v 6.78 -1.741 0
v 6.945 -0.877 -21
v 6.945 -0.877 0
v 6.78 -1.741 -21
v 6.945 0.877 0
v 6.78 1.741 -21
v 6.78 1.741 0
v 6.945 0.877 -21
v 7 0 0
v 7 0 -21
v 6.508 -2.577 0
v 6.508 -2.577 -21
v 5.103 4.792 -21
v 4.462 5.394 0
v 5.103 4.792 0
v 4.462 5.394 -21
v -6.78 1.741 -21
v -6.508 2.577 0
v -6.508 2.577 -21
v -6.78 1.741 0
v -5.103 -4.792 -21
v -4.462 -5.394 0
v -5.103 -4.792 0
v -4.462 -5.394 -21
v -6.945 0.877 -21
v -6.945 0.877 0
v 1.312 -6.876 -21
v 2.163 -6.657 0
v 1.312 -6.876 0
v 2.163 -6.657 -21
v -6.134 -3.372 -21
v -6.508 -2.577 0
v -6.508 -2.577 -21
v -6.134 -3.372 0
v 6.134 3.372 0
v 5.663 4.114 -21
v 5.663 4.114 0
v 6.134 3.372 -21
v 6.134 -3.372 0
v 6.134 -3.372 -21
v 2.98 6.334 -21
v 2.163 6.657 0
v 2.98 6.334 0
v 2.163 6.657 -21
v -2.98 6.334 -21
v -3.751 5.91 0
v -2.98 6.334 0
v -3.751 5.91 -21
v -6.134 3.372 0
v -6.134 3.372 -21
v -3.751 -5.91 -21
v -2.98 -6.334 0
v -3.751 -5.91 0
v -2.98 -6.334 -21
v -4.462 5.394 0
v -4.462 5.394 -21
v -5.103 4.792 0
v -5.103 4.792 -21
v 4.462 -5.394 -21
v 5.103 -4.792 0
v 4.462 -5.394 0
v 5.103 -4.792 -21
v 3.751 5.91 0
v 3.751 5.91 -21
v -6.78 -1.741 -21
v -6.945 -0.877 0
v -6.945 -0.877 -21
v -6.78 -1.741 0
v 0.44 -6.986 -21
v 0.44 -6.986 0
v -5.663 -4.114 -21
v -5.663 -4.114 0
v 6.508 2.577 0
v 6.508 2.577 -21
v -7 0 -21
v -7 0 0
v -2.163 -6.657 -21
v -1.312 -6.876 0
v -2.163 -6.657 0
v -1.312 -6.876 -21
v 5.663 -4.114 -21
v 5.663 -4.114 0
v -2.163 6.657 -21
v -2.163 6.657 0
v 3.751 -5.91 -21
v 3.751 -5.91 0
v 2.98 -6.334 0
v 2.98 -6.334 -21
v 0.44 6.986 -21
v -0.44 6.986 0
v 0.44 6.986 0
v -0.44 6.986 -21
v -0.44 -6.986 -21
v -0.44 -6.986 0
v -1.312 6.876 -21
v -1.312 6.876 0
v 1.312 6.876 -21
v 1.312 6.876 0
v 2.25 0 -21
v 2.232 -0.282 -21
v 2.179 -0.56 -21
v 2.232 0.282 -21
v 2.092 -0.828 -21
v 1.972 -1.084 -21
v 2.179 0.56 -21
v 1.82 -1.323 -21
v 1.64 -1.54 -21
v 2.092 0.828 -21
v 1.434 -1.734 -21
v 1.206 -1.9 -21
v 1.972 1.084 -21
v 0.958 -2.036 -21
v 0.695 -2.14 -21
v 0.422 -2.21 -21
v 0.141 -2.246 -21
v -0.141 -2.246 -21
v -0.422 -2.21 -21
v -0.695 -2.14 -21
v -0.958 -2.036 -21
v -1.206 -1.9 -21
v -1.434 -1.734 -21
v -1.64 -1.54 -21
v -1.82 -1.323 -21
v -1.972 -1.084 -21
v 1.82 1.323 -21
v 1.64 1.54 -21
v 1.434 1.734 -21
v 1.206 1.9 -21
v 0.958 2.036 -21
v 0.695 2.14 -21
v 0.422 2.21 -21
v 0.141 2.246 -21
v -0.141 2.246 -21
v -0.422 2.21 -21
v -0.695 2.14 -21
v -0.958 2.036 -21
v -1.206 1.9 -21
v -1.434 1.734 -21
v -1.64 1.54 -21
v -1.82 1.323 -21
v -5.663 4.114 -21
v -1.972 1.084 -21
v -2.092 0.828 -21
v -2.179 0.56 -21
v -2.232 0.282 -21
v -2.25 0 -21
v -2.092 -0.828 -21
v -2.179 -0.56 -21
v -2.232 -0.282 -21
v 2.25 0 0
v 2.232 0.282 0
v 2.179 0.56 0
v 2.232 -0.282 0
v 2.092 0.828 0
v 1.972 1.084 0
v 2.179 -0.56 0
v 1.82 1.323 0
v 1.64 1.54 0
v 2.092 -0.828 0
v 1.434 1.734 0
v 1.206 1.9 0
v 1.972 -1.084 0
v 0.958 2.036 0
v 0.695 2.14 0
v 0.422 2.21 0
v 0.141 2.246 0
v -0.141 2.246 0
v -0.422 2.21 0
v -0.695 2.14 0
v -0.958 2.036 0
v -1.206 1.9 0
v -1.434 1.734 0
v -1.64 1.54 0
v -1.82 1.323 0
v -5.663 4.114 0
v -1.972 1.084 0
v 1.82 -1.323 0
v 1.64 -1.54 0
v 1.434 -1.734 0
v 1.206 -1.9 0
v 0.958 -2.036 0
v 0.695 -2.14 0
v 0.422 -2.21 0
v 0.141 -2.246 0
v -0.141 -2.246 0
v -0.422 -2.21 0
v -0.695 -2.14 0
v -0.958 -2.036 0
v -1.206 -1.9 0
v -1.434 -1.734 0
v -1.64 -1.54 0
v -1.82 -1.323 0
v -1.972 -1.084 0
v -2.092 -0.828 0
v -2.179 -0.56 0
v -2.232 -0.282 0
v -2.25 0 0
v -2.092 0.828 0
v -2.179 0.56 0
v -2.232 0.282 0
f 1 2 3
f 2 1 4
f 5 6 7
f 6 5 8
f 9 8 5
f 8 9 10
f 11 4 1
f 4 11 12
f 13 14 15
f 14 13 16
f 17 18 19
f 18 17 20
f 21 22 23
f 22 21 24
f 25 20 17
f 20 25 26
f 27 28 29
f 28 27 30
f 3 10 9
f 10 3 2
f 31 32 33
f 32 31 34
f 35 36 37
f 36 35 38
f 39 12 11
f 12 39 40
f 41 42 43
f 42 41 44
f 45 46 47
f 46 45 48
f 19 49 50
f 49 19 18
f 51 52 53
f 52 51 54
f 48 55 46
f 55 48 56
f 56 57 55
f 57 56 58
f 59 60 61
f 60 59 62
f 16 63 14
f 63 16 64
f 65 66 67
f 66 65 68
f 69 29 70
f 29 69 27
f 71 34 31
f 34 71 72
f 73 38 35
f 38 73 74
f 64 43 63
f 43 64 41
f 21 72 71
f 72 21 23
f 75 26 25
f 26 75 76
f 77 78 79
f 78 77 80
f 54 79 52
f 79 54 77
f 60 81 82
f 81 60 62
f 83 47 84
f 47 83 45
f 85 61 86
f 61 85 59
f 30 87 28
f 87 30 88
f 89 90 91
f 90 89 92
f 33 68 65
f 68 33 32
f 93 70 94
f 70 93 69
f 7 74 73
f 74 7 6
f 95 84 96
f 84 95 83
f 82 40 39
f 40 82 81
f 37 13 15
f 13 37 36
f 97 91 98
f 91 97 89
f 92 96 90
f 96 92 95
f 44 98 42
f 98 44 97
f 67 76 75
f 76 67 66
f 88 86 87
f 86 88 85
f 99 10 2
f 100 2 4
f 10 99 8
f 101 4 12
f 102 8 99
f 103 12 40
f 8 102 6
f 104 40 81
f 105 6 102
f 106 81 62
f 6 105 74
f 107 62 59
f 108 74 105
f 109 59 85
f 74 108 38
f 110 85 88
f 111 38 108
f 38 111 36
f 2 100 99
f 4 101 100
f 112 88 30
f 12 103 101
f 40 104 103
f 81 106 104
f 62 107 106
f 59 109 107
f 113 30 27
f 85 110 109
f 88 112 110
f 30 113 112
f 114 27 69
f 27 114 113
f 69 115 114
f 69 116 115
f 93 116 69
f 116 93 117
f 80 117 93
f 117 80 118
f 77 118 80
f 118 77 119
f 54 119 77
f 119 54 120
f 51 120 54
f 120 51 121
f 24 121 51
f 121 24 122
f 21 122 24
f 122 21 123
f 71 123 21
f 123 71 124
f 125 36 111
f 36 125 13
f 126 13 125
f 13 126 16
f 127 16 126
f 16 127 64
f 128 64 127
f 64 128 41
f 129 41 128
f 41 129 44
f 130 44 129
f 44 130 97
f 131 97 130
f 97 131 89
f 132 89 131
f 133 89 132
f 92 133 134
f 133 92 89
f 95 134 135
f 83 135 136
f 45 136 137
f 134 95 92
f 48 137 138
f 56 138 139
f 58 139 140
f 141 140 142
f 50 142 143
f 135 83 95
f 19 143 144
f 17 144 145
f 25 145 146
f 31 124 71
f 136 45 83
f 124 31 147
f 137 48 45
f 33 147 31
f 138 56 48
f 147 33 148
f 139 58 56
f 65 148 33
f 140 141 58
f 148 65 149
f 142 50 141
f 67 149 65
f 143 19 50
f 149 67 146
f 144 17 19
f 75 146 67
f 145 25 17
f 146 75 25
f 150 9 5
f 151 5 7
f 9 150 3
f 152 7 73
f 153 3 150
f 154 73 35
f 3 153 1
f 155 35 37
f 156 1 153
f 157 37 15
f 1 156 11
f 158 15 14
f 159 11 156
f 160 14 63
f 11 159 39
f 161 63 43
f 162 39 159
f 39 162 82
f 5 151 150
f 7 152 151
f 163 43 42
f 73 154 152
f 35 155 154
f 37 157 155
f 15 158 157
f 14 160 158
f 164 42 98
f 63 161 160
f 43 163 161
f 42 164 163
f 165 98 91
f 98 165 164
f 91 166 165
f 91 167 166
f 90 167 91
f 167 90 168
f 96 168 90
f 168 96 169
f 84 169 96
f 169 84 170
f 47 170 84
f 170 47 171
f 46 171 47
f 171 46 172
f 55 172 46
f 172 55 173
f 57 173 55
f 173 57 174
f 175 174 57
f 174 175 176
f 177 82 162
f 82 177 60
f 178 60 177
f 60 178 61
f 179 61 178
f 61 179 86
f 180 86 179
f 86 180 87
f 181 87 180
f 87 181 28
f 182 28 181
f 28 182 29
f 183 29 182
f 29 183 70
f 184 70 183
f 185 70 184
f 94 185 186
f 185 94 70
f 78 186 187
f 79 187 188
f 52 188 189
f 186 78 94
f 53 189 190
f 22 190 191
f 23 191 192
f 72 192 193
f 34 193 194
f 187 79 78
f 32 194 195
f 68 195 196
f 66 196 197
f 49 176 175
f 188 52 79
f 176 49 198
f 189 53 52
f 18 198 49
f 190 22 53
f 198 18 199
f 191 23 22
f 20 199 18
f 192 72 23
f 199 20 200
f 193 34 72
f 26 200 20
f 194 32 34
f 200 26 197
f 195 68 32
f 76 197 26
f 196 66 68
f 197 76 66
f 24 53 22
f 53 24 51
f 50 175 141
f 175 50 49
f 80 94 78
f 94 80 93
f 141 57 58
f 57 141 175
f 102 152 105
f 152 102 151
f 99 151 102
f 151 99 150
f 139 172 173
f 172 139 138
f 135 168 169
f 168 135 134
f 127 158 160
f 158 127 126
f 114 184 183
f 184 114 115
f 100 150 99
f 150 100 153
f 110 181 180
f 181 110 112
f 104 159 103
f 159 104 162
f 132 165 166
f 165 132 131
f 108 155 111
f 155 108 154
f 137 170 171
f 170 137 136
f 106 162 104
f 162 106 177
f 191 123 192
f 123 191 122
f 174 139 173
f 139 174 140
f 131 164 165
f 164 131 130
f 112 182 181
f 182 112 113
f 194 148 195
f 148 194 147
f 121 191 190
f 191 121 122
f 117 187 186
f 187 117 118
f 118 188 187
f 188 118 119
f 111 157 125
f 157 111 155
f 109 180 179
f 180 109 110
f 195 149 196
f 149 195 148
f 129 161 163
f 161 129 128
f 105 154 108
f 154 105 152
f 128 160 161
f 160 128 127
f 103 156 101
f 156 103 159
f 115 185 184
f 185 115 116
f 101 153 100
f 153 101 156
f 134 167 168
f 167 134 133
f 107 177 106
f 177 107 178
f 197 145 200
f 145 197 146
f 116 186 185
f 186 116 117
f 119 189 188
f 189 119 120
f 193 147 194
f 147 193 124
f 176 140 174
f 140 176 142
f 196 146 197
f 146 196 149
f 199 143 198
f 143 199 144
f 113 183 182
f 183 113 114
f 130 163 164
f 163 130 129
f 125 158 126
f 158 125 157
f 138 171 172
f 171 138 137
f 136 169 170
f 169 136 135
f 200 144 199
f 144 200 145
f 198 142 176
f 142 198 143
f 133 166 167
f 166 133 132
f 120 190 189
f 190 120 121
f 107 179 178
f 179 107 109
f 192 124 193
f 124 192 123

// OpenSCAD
$fn = 50;


difference() {
	union() {
		translate(v = [0, 0, -21.0000000000]) {
			cylinder(h = 21, r = 7.0000000000);
		}
		cylinder(h = 0, r = 16.0000000000);
	}
	union() {
		#translate(v = [0, 0, -21]) {
			cylinder(h = 21, r = 2.2500000000);
		}
	}
}
